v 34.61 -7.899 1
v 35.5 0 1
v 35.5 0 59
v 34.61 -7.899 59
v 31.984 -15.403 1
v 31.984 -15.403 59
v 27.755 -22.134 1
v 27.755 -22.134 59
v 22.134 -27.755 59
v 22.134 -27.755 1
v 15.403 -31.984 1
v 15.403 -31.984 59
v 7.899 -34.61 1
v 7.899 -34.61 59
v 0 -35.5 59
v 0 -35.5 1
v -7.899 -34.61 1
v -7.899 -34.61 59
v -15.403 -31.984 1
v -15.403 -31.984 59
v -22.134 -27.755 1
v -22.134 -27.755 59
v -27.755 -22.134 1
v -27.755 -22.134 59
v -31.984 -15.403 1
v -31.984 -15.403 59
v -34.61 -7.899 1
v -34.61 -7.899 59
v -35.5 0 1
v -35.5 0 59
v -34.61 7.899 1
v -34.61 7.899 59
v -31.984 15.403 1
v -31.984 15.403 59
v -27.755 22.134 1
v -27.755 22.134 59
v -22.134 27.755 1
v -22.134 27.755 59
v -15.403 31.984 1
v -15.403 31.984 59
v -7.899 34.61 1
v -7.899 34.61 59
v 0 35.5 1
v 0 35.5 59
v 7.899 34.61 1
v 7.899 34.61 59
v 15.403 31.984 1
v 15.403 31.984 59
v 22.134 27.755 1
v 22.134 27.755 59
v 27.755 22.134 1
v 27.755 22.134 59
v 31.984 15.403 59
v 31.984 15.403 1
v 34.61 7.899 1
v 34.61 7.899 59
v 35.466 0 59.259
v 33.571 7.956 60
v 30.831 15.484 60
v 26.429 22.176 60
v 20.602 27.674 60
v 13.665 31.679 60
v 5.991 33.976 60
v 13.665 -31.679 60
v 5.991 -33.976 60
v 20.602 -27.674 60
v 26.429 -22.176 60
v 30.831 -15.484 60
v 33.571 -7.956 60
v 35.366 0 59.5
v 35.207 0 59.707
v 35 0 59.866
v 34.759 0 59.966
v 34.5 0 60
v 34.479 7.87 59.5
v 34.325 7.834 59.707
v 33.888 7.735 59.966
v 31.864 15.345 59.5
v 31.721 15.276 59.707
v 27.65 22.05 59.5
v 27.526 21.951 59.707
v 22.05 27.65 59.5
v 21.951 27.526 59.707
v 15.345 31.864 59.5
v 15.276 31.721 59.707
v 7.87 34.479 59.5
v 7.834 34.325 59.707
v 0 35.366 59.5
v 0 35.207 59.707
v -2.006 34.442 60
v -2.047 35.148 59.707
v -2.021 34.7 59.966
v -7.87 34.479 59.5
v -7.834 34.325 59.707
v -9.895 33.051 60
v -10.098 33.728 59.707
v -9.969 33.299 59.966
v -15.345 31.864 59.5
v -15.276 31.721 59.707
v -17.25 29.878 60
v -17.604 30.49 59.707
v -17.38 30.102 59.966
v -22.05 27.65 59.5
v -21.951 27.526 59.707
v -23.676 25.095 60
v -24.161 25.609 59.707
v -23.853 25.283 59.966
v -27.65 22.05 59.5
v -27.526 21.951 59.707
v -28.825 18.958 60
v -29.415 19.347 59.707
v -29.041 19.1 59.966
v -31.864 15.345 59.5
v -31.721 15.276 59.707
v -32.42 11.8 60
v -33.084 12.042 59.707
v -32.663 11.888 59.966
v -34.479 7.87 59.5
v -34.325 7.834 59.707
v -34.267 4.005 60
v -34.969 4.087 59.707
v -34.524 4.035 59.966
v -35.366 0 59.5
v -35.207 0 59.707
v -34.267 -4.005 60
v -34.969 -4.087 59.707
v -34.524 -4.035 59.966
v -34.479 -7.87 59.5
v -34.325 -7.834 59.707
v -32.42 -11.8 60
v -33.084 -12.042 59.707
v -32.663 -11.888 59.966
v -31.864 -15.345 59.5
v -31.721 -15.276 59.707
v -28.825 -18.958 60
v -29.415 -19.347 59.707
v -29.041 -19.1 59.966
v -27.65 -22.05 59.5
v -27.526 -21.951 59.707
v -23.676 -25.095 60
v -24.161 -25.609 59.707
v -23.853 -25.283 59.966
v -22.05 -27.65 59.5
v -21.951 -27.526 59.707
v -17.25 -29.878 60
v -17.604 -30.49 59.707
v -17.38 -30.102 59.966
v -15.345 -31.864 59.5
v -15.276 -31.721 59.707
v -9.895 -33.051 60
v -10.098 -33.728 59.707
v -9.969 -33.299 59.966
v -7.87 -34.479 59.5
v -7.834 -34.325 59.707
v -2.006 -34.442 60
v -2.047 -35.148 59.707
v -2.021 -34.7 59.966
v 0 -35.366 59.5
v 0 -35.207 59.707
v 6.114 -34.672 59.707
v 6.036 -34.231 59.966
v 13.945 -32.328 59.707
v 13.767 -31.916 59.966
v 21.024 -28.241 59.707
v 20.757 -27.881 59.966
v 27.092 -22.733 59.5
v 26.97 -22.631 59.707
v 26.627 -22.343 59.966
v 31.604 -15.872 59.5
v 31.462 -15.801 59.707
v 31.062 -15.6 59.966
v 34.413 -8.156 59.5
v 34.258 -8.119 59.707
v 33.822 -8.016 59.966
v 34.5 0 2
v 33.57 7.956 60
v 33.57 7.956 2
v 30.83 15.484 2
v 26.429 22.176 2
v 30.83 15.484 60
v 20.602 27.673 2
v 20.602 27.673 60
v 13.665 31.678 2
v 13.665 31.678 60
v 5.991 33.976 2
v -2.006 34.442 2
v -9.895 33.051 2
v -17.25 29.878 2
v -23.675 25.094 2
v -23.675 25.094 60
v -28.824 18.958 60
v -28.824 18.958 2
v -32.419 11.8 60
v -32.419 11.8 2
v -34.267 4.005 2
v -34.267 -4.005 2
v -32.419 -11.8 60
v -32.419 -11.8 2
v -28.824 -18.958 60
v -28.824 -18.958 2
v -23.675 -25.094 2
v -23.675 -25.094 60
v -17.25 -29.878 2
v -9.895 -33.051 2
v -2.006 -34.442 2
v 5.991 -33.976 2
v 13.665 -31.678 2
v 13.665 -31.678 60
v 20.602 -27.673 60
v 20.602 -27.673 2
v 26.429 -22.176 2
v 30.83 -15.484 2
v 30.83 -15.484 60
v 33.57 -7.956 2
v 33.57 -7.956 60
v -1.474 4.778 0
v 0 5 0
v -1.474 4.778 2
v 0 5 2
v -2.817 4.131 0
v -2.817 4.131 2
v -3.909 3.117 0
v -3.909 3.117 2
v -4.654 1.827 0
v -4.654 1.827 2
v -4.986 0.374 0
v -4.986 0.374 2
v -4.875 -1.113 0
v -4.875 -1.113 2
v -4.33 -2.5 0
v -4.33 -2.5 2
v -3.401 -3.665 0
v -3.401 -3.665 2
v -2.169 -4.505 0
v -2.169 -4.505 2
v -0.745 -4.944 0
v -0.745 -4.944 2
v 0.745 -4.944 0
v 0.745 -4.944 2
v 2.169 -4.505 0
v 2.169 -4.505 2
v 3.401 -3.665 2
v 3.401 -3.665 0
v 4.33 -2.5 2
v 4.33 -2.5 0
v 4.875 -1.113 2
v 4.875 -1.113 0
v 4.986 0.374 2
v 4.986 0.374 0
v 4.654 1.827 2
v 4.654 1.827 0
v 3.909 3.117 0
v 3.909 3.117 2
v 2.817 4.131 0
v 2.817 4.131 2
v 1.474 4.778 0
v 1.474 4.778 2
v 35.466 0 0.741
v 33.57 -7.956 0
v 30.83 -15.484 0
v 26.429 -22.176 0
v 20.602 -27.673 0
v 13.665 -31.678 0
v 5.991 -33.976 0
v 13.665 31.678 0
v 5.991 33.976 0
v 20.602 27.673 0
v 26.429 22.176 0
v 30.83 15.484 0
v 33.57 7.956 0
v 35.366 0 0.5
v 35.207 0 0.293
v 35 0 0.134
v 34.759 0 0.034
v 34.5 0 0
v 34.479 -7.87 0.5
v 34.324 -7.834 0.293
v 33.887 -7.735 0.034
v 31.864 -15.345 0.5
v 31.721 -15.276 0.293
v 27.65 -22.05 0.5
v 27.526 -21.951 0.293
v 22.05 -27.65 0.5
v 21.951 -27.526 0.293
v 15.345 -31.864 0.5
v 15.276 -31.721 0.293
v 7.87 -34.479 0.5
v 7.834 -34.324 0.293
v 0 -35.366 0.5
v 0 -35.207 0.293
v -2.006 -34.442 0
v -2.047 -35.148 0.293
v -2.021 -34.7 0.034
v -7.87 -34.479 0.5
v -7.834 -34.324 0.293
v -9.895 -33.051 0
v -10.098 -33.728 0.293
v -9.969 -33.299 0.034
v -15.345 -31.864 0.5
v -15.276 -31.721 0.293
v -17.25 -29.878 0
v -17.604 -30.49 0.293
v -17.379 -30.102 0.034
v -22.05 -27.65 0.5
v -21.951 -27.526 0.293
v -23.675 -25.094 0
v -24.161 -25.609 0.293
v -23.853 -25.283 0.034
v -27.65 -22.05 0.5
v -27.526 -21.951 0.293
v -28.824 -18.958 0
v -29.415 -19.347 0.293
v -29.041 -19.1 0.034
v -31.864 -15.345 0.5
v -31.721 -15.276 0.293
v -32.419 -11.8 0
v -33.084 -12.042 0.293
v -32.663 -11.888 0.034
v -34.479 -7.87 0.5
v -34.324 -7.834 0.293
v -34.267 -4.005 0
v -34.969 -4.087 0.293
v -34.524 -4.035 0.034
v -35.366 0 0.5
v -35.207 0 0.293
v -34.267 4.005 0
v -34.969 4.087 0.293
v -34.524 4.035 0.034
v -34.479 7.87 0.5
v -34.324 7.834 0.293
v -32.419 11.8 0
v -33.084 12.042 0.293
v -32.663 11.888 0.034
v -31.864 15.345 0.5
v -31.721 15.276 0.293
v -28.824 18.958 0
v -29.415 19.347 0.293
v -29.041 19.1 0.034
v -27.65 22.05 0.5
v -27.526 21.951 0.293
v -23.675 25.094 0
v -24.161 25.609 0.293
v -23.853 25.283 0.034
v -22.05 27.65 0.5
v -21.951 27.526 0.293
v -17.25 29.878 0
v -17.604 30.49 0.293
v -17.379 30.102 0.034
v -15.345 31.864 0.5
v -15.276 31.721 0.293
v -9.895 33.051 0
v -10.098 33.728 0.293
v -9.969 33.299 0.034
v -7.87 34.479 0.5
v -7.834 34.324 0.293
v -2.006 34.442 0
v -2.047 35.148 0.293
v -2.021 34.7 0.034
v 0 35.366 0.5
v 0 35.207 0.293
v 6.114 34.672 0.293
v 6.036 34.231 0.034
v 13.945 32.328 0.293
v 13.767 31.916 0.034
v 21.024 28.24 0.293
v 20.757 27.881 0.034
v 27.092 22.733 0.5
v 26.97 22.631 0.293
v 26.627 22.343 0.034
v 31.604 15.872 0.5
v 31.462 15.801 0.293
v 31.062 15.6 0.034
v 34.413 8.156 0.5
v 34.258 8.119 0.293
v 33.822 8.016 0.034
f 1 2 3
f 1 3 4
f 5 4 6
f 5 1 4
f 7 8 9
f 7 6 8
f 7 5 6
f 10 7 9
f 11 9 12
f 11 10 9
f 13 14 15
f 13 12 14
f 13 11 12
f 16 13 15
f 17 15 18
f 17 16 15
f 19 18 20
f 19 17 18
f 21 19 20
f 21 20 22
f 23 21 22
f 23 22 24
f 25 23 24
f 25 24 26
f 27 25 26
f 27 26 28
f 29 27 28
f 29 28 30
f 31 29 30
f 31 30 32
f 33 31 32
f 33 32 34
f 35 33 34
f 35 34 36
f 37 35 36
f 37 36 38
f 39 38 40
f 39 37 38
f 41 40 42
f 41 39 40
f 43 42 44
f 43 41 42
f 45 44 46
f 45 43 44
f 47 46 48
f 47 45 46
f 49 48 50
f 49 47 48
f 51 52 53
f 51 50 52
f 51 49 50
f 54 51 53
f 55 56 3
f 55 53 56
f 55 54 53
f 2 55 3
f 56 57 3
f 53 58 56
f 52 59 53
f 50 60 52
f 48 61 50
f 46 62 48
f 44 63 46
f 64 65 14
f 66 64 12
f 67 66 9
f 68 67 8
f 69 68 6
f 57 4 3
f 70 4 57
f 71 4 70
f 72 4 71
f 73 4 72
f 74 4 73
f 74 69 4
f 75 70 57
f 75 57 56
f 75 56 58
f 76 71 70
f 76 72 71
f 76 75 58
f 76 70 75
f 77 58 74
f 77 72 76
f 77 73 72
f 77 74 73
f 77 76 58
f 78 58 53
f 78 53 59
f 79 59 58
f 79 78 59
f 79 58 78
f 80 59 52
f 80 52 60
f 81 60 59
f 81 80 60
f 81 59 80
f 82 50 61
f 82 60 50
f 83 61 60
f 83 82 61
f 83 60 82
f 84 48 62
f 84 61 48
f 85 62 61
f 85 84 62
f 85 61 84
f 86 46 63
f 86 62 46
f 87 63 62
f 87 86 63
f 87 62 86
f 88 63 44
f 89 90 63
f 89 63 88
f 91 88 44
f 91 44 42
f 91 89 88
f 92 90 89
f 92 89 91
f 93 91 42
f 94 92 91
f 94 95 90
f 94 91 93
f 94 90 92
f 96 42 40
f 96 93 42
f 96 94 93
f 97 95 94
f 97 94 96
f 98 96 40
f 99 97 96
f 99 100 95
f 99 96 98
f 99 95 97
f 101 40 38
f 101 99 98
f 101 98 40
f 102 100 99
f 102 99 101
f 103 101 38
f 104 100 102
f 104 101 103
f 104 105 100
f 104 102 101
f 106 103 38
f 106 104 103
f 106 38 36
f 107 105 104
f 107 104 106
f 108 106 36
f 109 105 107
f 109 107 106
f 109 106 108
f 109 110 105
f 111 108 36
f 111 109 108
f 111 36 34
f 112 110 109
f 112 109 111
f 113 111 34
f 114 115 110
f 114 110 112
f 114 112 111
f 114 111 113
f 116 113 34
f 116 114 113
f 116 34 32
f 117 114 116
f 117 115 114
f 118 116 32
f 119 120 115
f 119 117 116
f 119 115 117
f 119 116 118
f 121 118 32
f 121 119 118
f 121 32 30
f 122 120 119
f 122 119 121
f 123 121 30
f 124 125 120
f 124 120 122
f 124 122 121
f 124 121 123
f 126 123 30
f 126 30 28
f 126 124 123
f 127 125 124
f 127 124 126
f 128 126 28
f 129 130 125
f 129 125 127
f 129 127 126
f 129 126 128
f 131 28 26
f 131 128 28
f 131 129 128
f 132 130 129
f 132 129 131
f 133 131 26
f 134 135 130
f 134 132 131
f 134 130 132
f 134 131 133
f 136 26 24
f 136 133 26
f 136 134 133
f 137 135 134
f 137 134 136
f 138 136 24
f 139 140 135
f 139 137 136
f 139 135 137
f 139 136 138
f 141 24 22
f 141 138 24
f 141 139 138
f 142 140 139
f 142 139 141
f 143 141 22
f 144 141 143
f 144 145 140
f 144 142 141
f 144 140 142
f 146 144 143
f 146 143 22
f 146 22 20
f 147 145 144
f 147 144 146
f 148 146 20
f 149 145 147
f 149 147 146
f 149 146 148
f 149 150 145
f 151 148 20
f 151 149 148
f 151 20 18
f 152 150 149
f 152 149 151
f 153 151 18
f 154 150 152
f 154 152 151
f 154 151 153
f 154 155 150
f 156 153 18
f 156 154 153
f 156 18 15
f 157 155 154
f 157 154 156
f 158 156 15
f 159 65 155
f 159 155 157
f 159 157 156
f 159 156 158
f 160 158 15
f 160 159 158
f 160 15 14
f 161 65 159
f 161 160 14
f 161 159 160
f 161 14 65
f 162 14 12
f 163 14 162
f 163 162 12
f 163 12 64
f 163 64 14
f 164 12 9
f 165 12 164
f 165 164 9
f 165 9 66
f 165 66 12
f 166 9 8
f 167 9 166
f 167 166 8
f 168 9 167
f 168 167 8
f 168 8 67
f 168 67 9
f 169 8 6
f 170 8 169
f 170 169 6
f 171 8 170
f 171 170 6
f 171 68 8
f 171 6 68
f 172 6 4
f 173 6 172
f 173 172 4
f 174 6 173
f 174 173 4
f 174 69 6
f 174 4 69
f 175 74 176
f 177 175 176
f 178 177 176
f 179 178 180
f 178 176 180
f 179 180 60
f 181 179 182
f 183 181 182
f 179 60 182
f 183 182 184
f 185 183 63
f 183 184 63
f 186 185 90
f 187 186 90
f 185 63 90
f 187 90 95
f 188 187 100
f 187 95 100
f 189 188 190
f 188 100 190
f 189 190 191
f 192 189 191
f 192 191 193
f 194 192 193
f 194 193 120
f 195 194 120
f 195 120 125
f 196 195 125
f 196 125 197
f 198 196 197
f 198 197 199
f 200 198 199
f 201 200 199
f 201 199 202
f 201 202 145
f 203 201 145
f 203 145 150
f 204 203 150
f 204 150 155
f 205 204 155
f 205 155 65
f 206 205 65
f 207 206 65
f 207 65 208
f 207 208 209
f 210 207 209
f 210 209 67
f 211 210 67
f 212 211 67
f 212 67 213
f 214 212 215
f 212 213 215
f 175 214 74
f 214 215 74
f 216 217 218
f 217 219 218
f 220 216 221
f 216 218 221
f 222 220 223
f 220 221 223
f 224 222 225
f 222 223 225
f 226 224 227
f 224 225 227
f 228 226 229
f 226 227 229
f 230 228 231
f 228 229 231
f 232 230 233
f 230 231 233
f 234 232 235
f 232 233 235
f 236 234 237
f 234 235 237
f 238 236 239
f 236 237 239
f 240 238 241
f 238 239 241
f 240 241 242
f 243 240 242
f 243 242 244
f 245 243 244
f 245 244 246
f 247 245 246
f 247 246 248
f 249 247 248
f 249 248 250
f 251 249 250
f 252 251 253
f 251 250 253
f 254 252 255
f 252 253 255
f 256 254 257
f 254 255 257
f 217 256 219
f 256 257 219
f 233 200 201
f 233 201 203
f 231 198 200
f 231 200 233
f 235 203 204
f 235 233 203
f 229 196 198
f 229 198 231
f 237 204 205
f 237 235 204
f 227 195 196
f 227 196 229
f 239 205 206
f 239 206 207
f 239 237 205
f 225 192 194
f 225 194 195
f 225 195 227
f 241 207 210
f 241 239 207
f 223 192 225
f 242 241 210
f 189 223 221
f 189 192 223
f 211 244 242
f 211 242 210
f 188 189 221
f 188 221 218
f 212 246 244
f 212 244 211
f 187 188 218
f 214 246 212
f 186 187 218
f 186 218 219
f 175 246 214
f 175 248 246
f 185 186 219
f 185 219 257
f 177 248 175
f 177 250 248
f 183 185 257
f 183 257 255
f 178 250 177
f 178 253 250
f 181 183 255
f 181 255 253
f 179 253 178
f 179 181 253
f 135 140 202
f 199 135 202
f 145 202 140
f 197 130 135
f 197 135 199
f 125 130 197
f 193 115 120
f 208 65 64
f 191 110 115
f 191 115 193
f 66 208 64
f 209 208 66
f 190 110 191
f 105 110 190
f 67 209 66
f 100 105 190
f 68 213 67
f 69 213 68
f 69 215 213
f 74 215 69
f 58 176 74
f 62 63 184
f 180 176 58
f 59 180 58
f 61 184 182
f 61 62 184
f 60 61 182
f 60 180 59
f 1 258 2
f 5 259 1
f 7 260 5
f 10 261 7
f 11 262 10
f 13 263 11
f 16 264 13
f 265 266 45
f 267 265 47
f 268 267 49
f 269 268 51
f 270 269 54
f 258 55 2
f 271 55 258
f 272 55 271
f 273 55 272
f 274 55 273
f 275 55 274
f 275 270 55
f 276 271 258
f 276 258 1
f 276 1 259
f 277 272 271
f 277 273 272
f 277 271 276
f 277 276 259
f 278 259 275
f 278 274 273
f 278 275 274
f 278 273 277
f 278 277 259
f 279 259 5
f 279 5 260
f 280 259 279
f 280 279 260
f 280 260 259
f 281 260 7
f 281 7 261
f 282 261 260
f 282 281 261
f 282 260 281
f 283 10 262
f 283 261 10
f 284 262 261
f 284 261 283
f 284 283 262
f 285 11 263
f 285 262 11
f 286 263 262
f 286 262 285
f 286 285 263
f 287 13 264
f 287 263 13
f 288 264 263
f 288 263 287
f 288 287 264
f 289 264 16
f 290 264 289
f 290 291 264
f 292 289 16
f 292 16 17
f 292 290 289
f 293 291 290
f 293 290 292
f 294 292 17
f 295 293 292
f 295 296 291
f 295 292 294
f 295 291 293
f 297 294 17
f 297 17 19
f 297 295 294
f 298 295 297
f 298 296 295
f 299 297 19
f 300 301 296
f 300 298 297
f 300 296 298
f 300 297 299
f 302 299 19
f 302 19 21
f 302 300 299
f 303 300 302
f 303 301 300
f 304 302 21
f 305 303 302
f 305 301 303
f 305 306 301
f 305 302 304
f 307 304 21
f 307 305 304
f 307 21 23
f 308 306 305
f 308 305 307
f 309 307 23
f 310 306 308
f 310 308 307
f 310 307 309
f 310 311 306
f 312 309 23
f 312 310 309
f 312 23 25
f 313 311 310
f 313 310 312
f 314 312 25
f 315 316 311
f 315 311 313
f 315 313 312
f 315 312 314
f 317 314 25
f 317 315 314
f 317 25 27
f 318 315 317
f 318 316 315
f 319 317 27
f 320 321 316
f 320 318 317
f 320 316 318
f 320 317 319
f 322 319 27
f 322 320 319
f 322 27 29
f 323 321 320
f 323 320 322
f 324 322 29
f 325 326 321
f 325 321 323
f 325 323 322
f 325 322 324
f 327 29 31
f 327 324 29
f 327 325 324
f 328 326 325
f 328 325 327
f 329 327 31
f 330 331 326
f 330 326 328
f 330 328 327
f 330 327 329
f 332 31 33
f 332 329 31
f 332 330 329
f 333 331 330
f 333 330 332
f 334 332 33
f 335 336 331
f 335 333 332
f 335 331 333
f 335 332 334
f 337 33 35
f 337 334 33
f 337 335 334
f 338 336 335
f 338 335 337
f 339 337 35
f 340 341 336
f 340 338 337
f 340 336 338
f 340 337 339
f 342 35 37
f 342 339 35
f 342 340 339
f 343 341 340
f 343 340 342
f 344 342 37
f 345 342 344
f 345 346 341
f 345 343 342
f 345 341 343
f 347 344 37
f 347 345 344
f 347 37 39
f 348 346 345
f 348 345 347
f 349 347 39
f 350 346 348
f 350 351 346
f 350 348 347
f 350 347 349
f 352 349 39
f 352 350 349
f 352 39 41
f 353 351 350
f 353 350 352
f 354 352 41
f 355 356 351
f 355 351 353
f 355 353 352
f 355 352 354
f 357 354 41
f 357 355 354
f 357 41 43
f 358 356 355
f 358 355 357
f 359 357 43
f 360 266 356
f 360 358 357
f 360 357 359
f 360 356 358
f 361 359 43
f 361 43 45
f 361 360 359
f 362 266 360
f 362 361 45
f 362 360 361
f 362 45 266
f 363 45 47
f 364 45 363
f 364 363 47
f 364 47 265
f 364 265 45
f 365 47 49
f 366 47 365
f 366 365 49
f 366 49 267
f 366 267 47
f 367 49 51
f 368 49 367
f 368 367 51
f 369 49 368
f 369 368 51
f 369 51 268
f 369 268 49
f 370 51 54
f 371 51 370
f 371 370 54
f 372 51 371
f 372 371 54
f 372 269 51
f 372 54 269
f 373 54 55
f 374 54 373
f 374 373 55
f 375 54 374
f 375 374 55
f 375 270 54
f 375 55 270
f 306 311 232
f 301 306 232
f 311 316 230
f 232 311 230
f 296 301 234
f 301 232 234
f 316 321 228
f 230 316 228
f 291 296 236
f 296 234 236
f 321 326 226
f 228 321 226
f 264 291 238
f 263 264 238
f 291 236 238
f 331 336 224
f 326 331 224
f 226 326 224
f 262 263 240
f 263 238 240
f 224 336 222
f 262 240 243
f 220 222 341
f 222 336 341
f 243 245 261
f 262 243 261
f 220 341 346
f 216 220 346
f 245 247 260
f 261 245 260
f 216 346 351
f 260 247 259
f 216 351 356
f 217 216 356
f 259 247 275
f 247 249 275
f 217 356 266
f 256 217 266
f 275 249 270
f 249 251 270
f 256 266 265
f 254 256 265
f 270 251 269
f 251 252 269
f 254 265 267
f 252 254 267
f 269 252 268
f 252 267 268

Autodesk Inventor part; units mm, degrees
ref_plane "YZ Plane" through (0, 0, 0) normal (1, 0, 0) x (0, 1, 0)
ref_plane "XZ Plane" through (0, 0, 0) normal (0, 1, 0) x (-1, 0, 0)
ref_plane "XY Plane" through (0, 0, 0) normal (0, 0, 1) x (1, 0, 0)
sketch "Sketch7" plane through (0, 0, 0) normal (0, 0, 1) x (1, 0, 0)
  circle A0 centre (0, 0) radius 35.5
  dimension "d32" = 71
extrude "Extrusion3" add sketch "Sketch7" along normal blind 60
sketch "Sketch9" plane through (0, 0, 60) normal (0, 0, 1) x (1, 0, 0)
  circle A0 centre (0, 0) radius 34.5
  dimension "d35" = 69
extrude "Extrusion4" cut sketch "Sketch9" against normal blind 58
fillet "Fillet3" radius 1 1 edges at (-35.5, 0, 0)
fillet "Fillet4" radius 1 1 edges at (-35.5, 0, 60)
sketch "Sketch10" plane through (0, 0, 0) normal (0, 0, -1) x (-1, 0, 0)
  circle A0 centre (0, 0) radius 5
  dimension "d40" = 10
hole "Hole4" at (0, 0, 0) direction (0, 0, 1) diameter 10 end through all
properties part number "expo7" material "Glass, Cast, Clear"
